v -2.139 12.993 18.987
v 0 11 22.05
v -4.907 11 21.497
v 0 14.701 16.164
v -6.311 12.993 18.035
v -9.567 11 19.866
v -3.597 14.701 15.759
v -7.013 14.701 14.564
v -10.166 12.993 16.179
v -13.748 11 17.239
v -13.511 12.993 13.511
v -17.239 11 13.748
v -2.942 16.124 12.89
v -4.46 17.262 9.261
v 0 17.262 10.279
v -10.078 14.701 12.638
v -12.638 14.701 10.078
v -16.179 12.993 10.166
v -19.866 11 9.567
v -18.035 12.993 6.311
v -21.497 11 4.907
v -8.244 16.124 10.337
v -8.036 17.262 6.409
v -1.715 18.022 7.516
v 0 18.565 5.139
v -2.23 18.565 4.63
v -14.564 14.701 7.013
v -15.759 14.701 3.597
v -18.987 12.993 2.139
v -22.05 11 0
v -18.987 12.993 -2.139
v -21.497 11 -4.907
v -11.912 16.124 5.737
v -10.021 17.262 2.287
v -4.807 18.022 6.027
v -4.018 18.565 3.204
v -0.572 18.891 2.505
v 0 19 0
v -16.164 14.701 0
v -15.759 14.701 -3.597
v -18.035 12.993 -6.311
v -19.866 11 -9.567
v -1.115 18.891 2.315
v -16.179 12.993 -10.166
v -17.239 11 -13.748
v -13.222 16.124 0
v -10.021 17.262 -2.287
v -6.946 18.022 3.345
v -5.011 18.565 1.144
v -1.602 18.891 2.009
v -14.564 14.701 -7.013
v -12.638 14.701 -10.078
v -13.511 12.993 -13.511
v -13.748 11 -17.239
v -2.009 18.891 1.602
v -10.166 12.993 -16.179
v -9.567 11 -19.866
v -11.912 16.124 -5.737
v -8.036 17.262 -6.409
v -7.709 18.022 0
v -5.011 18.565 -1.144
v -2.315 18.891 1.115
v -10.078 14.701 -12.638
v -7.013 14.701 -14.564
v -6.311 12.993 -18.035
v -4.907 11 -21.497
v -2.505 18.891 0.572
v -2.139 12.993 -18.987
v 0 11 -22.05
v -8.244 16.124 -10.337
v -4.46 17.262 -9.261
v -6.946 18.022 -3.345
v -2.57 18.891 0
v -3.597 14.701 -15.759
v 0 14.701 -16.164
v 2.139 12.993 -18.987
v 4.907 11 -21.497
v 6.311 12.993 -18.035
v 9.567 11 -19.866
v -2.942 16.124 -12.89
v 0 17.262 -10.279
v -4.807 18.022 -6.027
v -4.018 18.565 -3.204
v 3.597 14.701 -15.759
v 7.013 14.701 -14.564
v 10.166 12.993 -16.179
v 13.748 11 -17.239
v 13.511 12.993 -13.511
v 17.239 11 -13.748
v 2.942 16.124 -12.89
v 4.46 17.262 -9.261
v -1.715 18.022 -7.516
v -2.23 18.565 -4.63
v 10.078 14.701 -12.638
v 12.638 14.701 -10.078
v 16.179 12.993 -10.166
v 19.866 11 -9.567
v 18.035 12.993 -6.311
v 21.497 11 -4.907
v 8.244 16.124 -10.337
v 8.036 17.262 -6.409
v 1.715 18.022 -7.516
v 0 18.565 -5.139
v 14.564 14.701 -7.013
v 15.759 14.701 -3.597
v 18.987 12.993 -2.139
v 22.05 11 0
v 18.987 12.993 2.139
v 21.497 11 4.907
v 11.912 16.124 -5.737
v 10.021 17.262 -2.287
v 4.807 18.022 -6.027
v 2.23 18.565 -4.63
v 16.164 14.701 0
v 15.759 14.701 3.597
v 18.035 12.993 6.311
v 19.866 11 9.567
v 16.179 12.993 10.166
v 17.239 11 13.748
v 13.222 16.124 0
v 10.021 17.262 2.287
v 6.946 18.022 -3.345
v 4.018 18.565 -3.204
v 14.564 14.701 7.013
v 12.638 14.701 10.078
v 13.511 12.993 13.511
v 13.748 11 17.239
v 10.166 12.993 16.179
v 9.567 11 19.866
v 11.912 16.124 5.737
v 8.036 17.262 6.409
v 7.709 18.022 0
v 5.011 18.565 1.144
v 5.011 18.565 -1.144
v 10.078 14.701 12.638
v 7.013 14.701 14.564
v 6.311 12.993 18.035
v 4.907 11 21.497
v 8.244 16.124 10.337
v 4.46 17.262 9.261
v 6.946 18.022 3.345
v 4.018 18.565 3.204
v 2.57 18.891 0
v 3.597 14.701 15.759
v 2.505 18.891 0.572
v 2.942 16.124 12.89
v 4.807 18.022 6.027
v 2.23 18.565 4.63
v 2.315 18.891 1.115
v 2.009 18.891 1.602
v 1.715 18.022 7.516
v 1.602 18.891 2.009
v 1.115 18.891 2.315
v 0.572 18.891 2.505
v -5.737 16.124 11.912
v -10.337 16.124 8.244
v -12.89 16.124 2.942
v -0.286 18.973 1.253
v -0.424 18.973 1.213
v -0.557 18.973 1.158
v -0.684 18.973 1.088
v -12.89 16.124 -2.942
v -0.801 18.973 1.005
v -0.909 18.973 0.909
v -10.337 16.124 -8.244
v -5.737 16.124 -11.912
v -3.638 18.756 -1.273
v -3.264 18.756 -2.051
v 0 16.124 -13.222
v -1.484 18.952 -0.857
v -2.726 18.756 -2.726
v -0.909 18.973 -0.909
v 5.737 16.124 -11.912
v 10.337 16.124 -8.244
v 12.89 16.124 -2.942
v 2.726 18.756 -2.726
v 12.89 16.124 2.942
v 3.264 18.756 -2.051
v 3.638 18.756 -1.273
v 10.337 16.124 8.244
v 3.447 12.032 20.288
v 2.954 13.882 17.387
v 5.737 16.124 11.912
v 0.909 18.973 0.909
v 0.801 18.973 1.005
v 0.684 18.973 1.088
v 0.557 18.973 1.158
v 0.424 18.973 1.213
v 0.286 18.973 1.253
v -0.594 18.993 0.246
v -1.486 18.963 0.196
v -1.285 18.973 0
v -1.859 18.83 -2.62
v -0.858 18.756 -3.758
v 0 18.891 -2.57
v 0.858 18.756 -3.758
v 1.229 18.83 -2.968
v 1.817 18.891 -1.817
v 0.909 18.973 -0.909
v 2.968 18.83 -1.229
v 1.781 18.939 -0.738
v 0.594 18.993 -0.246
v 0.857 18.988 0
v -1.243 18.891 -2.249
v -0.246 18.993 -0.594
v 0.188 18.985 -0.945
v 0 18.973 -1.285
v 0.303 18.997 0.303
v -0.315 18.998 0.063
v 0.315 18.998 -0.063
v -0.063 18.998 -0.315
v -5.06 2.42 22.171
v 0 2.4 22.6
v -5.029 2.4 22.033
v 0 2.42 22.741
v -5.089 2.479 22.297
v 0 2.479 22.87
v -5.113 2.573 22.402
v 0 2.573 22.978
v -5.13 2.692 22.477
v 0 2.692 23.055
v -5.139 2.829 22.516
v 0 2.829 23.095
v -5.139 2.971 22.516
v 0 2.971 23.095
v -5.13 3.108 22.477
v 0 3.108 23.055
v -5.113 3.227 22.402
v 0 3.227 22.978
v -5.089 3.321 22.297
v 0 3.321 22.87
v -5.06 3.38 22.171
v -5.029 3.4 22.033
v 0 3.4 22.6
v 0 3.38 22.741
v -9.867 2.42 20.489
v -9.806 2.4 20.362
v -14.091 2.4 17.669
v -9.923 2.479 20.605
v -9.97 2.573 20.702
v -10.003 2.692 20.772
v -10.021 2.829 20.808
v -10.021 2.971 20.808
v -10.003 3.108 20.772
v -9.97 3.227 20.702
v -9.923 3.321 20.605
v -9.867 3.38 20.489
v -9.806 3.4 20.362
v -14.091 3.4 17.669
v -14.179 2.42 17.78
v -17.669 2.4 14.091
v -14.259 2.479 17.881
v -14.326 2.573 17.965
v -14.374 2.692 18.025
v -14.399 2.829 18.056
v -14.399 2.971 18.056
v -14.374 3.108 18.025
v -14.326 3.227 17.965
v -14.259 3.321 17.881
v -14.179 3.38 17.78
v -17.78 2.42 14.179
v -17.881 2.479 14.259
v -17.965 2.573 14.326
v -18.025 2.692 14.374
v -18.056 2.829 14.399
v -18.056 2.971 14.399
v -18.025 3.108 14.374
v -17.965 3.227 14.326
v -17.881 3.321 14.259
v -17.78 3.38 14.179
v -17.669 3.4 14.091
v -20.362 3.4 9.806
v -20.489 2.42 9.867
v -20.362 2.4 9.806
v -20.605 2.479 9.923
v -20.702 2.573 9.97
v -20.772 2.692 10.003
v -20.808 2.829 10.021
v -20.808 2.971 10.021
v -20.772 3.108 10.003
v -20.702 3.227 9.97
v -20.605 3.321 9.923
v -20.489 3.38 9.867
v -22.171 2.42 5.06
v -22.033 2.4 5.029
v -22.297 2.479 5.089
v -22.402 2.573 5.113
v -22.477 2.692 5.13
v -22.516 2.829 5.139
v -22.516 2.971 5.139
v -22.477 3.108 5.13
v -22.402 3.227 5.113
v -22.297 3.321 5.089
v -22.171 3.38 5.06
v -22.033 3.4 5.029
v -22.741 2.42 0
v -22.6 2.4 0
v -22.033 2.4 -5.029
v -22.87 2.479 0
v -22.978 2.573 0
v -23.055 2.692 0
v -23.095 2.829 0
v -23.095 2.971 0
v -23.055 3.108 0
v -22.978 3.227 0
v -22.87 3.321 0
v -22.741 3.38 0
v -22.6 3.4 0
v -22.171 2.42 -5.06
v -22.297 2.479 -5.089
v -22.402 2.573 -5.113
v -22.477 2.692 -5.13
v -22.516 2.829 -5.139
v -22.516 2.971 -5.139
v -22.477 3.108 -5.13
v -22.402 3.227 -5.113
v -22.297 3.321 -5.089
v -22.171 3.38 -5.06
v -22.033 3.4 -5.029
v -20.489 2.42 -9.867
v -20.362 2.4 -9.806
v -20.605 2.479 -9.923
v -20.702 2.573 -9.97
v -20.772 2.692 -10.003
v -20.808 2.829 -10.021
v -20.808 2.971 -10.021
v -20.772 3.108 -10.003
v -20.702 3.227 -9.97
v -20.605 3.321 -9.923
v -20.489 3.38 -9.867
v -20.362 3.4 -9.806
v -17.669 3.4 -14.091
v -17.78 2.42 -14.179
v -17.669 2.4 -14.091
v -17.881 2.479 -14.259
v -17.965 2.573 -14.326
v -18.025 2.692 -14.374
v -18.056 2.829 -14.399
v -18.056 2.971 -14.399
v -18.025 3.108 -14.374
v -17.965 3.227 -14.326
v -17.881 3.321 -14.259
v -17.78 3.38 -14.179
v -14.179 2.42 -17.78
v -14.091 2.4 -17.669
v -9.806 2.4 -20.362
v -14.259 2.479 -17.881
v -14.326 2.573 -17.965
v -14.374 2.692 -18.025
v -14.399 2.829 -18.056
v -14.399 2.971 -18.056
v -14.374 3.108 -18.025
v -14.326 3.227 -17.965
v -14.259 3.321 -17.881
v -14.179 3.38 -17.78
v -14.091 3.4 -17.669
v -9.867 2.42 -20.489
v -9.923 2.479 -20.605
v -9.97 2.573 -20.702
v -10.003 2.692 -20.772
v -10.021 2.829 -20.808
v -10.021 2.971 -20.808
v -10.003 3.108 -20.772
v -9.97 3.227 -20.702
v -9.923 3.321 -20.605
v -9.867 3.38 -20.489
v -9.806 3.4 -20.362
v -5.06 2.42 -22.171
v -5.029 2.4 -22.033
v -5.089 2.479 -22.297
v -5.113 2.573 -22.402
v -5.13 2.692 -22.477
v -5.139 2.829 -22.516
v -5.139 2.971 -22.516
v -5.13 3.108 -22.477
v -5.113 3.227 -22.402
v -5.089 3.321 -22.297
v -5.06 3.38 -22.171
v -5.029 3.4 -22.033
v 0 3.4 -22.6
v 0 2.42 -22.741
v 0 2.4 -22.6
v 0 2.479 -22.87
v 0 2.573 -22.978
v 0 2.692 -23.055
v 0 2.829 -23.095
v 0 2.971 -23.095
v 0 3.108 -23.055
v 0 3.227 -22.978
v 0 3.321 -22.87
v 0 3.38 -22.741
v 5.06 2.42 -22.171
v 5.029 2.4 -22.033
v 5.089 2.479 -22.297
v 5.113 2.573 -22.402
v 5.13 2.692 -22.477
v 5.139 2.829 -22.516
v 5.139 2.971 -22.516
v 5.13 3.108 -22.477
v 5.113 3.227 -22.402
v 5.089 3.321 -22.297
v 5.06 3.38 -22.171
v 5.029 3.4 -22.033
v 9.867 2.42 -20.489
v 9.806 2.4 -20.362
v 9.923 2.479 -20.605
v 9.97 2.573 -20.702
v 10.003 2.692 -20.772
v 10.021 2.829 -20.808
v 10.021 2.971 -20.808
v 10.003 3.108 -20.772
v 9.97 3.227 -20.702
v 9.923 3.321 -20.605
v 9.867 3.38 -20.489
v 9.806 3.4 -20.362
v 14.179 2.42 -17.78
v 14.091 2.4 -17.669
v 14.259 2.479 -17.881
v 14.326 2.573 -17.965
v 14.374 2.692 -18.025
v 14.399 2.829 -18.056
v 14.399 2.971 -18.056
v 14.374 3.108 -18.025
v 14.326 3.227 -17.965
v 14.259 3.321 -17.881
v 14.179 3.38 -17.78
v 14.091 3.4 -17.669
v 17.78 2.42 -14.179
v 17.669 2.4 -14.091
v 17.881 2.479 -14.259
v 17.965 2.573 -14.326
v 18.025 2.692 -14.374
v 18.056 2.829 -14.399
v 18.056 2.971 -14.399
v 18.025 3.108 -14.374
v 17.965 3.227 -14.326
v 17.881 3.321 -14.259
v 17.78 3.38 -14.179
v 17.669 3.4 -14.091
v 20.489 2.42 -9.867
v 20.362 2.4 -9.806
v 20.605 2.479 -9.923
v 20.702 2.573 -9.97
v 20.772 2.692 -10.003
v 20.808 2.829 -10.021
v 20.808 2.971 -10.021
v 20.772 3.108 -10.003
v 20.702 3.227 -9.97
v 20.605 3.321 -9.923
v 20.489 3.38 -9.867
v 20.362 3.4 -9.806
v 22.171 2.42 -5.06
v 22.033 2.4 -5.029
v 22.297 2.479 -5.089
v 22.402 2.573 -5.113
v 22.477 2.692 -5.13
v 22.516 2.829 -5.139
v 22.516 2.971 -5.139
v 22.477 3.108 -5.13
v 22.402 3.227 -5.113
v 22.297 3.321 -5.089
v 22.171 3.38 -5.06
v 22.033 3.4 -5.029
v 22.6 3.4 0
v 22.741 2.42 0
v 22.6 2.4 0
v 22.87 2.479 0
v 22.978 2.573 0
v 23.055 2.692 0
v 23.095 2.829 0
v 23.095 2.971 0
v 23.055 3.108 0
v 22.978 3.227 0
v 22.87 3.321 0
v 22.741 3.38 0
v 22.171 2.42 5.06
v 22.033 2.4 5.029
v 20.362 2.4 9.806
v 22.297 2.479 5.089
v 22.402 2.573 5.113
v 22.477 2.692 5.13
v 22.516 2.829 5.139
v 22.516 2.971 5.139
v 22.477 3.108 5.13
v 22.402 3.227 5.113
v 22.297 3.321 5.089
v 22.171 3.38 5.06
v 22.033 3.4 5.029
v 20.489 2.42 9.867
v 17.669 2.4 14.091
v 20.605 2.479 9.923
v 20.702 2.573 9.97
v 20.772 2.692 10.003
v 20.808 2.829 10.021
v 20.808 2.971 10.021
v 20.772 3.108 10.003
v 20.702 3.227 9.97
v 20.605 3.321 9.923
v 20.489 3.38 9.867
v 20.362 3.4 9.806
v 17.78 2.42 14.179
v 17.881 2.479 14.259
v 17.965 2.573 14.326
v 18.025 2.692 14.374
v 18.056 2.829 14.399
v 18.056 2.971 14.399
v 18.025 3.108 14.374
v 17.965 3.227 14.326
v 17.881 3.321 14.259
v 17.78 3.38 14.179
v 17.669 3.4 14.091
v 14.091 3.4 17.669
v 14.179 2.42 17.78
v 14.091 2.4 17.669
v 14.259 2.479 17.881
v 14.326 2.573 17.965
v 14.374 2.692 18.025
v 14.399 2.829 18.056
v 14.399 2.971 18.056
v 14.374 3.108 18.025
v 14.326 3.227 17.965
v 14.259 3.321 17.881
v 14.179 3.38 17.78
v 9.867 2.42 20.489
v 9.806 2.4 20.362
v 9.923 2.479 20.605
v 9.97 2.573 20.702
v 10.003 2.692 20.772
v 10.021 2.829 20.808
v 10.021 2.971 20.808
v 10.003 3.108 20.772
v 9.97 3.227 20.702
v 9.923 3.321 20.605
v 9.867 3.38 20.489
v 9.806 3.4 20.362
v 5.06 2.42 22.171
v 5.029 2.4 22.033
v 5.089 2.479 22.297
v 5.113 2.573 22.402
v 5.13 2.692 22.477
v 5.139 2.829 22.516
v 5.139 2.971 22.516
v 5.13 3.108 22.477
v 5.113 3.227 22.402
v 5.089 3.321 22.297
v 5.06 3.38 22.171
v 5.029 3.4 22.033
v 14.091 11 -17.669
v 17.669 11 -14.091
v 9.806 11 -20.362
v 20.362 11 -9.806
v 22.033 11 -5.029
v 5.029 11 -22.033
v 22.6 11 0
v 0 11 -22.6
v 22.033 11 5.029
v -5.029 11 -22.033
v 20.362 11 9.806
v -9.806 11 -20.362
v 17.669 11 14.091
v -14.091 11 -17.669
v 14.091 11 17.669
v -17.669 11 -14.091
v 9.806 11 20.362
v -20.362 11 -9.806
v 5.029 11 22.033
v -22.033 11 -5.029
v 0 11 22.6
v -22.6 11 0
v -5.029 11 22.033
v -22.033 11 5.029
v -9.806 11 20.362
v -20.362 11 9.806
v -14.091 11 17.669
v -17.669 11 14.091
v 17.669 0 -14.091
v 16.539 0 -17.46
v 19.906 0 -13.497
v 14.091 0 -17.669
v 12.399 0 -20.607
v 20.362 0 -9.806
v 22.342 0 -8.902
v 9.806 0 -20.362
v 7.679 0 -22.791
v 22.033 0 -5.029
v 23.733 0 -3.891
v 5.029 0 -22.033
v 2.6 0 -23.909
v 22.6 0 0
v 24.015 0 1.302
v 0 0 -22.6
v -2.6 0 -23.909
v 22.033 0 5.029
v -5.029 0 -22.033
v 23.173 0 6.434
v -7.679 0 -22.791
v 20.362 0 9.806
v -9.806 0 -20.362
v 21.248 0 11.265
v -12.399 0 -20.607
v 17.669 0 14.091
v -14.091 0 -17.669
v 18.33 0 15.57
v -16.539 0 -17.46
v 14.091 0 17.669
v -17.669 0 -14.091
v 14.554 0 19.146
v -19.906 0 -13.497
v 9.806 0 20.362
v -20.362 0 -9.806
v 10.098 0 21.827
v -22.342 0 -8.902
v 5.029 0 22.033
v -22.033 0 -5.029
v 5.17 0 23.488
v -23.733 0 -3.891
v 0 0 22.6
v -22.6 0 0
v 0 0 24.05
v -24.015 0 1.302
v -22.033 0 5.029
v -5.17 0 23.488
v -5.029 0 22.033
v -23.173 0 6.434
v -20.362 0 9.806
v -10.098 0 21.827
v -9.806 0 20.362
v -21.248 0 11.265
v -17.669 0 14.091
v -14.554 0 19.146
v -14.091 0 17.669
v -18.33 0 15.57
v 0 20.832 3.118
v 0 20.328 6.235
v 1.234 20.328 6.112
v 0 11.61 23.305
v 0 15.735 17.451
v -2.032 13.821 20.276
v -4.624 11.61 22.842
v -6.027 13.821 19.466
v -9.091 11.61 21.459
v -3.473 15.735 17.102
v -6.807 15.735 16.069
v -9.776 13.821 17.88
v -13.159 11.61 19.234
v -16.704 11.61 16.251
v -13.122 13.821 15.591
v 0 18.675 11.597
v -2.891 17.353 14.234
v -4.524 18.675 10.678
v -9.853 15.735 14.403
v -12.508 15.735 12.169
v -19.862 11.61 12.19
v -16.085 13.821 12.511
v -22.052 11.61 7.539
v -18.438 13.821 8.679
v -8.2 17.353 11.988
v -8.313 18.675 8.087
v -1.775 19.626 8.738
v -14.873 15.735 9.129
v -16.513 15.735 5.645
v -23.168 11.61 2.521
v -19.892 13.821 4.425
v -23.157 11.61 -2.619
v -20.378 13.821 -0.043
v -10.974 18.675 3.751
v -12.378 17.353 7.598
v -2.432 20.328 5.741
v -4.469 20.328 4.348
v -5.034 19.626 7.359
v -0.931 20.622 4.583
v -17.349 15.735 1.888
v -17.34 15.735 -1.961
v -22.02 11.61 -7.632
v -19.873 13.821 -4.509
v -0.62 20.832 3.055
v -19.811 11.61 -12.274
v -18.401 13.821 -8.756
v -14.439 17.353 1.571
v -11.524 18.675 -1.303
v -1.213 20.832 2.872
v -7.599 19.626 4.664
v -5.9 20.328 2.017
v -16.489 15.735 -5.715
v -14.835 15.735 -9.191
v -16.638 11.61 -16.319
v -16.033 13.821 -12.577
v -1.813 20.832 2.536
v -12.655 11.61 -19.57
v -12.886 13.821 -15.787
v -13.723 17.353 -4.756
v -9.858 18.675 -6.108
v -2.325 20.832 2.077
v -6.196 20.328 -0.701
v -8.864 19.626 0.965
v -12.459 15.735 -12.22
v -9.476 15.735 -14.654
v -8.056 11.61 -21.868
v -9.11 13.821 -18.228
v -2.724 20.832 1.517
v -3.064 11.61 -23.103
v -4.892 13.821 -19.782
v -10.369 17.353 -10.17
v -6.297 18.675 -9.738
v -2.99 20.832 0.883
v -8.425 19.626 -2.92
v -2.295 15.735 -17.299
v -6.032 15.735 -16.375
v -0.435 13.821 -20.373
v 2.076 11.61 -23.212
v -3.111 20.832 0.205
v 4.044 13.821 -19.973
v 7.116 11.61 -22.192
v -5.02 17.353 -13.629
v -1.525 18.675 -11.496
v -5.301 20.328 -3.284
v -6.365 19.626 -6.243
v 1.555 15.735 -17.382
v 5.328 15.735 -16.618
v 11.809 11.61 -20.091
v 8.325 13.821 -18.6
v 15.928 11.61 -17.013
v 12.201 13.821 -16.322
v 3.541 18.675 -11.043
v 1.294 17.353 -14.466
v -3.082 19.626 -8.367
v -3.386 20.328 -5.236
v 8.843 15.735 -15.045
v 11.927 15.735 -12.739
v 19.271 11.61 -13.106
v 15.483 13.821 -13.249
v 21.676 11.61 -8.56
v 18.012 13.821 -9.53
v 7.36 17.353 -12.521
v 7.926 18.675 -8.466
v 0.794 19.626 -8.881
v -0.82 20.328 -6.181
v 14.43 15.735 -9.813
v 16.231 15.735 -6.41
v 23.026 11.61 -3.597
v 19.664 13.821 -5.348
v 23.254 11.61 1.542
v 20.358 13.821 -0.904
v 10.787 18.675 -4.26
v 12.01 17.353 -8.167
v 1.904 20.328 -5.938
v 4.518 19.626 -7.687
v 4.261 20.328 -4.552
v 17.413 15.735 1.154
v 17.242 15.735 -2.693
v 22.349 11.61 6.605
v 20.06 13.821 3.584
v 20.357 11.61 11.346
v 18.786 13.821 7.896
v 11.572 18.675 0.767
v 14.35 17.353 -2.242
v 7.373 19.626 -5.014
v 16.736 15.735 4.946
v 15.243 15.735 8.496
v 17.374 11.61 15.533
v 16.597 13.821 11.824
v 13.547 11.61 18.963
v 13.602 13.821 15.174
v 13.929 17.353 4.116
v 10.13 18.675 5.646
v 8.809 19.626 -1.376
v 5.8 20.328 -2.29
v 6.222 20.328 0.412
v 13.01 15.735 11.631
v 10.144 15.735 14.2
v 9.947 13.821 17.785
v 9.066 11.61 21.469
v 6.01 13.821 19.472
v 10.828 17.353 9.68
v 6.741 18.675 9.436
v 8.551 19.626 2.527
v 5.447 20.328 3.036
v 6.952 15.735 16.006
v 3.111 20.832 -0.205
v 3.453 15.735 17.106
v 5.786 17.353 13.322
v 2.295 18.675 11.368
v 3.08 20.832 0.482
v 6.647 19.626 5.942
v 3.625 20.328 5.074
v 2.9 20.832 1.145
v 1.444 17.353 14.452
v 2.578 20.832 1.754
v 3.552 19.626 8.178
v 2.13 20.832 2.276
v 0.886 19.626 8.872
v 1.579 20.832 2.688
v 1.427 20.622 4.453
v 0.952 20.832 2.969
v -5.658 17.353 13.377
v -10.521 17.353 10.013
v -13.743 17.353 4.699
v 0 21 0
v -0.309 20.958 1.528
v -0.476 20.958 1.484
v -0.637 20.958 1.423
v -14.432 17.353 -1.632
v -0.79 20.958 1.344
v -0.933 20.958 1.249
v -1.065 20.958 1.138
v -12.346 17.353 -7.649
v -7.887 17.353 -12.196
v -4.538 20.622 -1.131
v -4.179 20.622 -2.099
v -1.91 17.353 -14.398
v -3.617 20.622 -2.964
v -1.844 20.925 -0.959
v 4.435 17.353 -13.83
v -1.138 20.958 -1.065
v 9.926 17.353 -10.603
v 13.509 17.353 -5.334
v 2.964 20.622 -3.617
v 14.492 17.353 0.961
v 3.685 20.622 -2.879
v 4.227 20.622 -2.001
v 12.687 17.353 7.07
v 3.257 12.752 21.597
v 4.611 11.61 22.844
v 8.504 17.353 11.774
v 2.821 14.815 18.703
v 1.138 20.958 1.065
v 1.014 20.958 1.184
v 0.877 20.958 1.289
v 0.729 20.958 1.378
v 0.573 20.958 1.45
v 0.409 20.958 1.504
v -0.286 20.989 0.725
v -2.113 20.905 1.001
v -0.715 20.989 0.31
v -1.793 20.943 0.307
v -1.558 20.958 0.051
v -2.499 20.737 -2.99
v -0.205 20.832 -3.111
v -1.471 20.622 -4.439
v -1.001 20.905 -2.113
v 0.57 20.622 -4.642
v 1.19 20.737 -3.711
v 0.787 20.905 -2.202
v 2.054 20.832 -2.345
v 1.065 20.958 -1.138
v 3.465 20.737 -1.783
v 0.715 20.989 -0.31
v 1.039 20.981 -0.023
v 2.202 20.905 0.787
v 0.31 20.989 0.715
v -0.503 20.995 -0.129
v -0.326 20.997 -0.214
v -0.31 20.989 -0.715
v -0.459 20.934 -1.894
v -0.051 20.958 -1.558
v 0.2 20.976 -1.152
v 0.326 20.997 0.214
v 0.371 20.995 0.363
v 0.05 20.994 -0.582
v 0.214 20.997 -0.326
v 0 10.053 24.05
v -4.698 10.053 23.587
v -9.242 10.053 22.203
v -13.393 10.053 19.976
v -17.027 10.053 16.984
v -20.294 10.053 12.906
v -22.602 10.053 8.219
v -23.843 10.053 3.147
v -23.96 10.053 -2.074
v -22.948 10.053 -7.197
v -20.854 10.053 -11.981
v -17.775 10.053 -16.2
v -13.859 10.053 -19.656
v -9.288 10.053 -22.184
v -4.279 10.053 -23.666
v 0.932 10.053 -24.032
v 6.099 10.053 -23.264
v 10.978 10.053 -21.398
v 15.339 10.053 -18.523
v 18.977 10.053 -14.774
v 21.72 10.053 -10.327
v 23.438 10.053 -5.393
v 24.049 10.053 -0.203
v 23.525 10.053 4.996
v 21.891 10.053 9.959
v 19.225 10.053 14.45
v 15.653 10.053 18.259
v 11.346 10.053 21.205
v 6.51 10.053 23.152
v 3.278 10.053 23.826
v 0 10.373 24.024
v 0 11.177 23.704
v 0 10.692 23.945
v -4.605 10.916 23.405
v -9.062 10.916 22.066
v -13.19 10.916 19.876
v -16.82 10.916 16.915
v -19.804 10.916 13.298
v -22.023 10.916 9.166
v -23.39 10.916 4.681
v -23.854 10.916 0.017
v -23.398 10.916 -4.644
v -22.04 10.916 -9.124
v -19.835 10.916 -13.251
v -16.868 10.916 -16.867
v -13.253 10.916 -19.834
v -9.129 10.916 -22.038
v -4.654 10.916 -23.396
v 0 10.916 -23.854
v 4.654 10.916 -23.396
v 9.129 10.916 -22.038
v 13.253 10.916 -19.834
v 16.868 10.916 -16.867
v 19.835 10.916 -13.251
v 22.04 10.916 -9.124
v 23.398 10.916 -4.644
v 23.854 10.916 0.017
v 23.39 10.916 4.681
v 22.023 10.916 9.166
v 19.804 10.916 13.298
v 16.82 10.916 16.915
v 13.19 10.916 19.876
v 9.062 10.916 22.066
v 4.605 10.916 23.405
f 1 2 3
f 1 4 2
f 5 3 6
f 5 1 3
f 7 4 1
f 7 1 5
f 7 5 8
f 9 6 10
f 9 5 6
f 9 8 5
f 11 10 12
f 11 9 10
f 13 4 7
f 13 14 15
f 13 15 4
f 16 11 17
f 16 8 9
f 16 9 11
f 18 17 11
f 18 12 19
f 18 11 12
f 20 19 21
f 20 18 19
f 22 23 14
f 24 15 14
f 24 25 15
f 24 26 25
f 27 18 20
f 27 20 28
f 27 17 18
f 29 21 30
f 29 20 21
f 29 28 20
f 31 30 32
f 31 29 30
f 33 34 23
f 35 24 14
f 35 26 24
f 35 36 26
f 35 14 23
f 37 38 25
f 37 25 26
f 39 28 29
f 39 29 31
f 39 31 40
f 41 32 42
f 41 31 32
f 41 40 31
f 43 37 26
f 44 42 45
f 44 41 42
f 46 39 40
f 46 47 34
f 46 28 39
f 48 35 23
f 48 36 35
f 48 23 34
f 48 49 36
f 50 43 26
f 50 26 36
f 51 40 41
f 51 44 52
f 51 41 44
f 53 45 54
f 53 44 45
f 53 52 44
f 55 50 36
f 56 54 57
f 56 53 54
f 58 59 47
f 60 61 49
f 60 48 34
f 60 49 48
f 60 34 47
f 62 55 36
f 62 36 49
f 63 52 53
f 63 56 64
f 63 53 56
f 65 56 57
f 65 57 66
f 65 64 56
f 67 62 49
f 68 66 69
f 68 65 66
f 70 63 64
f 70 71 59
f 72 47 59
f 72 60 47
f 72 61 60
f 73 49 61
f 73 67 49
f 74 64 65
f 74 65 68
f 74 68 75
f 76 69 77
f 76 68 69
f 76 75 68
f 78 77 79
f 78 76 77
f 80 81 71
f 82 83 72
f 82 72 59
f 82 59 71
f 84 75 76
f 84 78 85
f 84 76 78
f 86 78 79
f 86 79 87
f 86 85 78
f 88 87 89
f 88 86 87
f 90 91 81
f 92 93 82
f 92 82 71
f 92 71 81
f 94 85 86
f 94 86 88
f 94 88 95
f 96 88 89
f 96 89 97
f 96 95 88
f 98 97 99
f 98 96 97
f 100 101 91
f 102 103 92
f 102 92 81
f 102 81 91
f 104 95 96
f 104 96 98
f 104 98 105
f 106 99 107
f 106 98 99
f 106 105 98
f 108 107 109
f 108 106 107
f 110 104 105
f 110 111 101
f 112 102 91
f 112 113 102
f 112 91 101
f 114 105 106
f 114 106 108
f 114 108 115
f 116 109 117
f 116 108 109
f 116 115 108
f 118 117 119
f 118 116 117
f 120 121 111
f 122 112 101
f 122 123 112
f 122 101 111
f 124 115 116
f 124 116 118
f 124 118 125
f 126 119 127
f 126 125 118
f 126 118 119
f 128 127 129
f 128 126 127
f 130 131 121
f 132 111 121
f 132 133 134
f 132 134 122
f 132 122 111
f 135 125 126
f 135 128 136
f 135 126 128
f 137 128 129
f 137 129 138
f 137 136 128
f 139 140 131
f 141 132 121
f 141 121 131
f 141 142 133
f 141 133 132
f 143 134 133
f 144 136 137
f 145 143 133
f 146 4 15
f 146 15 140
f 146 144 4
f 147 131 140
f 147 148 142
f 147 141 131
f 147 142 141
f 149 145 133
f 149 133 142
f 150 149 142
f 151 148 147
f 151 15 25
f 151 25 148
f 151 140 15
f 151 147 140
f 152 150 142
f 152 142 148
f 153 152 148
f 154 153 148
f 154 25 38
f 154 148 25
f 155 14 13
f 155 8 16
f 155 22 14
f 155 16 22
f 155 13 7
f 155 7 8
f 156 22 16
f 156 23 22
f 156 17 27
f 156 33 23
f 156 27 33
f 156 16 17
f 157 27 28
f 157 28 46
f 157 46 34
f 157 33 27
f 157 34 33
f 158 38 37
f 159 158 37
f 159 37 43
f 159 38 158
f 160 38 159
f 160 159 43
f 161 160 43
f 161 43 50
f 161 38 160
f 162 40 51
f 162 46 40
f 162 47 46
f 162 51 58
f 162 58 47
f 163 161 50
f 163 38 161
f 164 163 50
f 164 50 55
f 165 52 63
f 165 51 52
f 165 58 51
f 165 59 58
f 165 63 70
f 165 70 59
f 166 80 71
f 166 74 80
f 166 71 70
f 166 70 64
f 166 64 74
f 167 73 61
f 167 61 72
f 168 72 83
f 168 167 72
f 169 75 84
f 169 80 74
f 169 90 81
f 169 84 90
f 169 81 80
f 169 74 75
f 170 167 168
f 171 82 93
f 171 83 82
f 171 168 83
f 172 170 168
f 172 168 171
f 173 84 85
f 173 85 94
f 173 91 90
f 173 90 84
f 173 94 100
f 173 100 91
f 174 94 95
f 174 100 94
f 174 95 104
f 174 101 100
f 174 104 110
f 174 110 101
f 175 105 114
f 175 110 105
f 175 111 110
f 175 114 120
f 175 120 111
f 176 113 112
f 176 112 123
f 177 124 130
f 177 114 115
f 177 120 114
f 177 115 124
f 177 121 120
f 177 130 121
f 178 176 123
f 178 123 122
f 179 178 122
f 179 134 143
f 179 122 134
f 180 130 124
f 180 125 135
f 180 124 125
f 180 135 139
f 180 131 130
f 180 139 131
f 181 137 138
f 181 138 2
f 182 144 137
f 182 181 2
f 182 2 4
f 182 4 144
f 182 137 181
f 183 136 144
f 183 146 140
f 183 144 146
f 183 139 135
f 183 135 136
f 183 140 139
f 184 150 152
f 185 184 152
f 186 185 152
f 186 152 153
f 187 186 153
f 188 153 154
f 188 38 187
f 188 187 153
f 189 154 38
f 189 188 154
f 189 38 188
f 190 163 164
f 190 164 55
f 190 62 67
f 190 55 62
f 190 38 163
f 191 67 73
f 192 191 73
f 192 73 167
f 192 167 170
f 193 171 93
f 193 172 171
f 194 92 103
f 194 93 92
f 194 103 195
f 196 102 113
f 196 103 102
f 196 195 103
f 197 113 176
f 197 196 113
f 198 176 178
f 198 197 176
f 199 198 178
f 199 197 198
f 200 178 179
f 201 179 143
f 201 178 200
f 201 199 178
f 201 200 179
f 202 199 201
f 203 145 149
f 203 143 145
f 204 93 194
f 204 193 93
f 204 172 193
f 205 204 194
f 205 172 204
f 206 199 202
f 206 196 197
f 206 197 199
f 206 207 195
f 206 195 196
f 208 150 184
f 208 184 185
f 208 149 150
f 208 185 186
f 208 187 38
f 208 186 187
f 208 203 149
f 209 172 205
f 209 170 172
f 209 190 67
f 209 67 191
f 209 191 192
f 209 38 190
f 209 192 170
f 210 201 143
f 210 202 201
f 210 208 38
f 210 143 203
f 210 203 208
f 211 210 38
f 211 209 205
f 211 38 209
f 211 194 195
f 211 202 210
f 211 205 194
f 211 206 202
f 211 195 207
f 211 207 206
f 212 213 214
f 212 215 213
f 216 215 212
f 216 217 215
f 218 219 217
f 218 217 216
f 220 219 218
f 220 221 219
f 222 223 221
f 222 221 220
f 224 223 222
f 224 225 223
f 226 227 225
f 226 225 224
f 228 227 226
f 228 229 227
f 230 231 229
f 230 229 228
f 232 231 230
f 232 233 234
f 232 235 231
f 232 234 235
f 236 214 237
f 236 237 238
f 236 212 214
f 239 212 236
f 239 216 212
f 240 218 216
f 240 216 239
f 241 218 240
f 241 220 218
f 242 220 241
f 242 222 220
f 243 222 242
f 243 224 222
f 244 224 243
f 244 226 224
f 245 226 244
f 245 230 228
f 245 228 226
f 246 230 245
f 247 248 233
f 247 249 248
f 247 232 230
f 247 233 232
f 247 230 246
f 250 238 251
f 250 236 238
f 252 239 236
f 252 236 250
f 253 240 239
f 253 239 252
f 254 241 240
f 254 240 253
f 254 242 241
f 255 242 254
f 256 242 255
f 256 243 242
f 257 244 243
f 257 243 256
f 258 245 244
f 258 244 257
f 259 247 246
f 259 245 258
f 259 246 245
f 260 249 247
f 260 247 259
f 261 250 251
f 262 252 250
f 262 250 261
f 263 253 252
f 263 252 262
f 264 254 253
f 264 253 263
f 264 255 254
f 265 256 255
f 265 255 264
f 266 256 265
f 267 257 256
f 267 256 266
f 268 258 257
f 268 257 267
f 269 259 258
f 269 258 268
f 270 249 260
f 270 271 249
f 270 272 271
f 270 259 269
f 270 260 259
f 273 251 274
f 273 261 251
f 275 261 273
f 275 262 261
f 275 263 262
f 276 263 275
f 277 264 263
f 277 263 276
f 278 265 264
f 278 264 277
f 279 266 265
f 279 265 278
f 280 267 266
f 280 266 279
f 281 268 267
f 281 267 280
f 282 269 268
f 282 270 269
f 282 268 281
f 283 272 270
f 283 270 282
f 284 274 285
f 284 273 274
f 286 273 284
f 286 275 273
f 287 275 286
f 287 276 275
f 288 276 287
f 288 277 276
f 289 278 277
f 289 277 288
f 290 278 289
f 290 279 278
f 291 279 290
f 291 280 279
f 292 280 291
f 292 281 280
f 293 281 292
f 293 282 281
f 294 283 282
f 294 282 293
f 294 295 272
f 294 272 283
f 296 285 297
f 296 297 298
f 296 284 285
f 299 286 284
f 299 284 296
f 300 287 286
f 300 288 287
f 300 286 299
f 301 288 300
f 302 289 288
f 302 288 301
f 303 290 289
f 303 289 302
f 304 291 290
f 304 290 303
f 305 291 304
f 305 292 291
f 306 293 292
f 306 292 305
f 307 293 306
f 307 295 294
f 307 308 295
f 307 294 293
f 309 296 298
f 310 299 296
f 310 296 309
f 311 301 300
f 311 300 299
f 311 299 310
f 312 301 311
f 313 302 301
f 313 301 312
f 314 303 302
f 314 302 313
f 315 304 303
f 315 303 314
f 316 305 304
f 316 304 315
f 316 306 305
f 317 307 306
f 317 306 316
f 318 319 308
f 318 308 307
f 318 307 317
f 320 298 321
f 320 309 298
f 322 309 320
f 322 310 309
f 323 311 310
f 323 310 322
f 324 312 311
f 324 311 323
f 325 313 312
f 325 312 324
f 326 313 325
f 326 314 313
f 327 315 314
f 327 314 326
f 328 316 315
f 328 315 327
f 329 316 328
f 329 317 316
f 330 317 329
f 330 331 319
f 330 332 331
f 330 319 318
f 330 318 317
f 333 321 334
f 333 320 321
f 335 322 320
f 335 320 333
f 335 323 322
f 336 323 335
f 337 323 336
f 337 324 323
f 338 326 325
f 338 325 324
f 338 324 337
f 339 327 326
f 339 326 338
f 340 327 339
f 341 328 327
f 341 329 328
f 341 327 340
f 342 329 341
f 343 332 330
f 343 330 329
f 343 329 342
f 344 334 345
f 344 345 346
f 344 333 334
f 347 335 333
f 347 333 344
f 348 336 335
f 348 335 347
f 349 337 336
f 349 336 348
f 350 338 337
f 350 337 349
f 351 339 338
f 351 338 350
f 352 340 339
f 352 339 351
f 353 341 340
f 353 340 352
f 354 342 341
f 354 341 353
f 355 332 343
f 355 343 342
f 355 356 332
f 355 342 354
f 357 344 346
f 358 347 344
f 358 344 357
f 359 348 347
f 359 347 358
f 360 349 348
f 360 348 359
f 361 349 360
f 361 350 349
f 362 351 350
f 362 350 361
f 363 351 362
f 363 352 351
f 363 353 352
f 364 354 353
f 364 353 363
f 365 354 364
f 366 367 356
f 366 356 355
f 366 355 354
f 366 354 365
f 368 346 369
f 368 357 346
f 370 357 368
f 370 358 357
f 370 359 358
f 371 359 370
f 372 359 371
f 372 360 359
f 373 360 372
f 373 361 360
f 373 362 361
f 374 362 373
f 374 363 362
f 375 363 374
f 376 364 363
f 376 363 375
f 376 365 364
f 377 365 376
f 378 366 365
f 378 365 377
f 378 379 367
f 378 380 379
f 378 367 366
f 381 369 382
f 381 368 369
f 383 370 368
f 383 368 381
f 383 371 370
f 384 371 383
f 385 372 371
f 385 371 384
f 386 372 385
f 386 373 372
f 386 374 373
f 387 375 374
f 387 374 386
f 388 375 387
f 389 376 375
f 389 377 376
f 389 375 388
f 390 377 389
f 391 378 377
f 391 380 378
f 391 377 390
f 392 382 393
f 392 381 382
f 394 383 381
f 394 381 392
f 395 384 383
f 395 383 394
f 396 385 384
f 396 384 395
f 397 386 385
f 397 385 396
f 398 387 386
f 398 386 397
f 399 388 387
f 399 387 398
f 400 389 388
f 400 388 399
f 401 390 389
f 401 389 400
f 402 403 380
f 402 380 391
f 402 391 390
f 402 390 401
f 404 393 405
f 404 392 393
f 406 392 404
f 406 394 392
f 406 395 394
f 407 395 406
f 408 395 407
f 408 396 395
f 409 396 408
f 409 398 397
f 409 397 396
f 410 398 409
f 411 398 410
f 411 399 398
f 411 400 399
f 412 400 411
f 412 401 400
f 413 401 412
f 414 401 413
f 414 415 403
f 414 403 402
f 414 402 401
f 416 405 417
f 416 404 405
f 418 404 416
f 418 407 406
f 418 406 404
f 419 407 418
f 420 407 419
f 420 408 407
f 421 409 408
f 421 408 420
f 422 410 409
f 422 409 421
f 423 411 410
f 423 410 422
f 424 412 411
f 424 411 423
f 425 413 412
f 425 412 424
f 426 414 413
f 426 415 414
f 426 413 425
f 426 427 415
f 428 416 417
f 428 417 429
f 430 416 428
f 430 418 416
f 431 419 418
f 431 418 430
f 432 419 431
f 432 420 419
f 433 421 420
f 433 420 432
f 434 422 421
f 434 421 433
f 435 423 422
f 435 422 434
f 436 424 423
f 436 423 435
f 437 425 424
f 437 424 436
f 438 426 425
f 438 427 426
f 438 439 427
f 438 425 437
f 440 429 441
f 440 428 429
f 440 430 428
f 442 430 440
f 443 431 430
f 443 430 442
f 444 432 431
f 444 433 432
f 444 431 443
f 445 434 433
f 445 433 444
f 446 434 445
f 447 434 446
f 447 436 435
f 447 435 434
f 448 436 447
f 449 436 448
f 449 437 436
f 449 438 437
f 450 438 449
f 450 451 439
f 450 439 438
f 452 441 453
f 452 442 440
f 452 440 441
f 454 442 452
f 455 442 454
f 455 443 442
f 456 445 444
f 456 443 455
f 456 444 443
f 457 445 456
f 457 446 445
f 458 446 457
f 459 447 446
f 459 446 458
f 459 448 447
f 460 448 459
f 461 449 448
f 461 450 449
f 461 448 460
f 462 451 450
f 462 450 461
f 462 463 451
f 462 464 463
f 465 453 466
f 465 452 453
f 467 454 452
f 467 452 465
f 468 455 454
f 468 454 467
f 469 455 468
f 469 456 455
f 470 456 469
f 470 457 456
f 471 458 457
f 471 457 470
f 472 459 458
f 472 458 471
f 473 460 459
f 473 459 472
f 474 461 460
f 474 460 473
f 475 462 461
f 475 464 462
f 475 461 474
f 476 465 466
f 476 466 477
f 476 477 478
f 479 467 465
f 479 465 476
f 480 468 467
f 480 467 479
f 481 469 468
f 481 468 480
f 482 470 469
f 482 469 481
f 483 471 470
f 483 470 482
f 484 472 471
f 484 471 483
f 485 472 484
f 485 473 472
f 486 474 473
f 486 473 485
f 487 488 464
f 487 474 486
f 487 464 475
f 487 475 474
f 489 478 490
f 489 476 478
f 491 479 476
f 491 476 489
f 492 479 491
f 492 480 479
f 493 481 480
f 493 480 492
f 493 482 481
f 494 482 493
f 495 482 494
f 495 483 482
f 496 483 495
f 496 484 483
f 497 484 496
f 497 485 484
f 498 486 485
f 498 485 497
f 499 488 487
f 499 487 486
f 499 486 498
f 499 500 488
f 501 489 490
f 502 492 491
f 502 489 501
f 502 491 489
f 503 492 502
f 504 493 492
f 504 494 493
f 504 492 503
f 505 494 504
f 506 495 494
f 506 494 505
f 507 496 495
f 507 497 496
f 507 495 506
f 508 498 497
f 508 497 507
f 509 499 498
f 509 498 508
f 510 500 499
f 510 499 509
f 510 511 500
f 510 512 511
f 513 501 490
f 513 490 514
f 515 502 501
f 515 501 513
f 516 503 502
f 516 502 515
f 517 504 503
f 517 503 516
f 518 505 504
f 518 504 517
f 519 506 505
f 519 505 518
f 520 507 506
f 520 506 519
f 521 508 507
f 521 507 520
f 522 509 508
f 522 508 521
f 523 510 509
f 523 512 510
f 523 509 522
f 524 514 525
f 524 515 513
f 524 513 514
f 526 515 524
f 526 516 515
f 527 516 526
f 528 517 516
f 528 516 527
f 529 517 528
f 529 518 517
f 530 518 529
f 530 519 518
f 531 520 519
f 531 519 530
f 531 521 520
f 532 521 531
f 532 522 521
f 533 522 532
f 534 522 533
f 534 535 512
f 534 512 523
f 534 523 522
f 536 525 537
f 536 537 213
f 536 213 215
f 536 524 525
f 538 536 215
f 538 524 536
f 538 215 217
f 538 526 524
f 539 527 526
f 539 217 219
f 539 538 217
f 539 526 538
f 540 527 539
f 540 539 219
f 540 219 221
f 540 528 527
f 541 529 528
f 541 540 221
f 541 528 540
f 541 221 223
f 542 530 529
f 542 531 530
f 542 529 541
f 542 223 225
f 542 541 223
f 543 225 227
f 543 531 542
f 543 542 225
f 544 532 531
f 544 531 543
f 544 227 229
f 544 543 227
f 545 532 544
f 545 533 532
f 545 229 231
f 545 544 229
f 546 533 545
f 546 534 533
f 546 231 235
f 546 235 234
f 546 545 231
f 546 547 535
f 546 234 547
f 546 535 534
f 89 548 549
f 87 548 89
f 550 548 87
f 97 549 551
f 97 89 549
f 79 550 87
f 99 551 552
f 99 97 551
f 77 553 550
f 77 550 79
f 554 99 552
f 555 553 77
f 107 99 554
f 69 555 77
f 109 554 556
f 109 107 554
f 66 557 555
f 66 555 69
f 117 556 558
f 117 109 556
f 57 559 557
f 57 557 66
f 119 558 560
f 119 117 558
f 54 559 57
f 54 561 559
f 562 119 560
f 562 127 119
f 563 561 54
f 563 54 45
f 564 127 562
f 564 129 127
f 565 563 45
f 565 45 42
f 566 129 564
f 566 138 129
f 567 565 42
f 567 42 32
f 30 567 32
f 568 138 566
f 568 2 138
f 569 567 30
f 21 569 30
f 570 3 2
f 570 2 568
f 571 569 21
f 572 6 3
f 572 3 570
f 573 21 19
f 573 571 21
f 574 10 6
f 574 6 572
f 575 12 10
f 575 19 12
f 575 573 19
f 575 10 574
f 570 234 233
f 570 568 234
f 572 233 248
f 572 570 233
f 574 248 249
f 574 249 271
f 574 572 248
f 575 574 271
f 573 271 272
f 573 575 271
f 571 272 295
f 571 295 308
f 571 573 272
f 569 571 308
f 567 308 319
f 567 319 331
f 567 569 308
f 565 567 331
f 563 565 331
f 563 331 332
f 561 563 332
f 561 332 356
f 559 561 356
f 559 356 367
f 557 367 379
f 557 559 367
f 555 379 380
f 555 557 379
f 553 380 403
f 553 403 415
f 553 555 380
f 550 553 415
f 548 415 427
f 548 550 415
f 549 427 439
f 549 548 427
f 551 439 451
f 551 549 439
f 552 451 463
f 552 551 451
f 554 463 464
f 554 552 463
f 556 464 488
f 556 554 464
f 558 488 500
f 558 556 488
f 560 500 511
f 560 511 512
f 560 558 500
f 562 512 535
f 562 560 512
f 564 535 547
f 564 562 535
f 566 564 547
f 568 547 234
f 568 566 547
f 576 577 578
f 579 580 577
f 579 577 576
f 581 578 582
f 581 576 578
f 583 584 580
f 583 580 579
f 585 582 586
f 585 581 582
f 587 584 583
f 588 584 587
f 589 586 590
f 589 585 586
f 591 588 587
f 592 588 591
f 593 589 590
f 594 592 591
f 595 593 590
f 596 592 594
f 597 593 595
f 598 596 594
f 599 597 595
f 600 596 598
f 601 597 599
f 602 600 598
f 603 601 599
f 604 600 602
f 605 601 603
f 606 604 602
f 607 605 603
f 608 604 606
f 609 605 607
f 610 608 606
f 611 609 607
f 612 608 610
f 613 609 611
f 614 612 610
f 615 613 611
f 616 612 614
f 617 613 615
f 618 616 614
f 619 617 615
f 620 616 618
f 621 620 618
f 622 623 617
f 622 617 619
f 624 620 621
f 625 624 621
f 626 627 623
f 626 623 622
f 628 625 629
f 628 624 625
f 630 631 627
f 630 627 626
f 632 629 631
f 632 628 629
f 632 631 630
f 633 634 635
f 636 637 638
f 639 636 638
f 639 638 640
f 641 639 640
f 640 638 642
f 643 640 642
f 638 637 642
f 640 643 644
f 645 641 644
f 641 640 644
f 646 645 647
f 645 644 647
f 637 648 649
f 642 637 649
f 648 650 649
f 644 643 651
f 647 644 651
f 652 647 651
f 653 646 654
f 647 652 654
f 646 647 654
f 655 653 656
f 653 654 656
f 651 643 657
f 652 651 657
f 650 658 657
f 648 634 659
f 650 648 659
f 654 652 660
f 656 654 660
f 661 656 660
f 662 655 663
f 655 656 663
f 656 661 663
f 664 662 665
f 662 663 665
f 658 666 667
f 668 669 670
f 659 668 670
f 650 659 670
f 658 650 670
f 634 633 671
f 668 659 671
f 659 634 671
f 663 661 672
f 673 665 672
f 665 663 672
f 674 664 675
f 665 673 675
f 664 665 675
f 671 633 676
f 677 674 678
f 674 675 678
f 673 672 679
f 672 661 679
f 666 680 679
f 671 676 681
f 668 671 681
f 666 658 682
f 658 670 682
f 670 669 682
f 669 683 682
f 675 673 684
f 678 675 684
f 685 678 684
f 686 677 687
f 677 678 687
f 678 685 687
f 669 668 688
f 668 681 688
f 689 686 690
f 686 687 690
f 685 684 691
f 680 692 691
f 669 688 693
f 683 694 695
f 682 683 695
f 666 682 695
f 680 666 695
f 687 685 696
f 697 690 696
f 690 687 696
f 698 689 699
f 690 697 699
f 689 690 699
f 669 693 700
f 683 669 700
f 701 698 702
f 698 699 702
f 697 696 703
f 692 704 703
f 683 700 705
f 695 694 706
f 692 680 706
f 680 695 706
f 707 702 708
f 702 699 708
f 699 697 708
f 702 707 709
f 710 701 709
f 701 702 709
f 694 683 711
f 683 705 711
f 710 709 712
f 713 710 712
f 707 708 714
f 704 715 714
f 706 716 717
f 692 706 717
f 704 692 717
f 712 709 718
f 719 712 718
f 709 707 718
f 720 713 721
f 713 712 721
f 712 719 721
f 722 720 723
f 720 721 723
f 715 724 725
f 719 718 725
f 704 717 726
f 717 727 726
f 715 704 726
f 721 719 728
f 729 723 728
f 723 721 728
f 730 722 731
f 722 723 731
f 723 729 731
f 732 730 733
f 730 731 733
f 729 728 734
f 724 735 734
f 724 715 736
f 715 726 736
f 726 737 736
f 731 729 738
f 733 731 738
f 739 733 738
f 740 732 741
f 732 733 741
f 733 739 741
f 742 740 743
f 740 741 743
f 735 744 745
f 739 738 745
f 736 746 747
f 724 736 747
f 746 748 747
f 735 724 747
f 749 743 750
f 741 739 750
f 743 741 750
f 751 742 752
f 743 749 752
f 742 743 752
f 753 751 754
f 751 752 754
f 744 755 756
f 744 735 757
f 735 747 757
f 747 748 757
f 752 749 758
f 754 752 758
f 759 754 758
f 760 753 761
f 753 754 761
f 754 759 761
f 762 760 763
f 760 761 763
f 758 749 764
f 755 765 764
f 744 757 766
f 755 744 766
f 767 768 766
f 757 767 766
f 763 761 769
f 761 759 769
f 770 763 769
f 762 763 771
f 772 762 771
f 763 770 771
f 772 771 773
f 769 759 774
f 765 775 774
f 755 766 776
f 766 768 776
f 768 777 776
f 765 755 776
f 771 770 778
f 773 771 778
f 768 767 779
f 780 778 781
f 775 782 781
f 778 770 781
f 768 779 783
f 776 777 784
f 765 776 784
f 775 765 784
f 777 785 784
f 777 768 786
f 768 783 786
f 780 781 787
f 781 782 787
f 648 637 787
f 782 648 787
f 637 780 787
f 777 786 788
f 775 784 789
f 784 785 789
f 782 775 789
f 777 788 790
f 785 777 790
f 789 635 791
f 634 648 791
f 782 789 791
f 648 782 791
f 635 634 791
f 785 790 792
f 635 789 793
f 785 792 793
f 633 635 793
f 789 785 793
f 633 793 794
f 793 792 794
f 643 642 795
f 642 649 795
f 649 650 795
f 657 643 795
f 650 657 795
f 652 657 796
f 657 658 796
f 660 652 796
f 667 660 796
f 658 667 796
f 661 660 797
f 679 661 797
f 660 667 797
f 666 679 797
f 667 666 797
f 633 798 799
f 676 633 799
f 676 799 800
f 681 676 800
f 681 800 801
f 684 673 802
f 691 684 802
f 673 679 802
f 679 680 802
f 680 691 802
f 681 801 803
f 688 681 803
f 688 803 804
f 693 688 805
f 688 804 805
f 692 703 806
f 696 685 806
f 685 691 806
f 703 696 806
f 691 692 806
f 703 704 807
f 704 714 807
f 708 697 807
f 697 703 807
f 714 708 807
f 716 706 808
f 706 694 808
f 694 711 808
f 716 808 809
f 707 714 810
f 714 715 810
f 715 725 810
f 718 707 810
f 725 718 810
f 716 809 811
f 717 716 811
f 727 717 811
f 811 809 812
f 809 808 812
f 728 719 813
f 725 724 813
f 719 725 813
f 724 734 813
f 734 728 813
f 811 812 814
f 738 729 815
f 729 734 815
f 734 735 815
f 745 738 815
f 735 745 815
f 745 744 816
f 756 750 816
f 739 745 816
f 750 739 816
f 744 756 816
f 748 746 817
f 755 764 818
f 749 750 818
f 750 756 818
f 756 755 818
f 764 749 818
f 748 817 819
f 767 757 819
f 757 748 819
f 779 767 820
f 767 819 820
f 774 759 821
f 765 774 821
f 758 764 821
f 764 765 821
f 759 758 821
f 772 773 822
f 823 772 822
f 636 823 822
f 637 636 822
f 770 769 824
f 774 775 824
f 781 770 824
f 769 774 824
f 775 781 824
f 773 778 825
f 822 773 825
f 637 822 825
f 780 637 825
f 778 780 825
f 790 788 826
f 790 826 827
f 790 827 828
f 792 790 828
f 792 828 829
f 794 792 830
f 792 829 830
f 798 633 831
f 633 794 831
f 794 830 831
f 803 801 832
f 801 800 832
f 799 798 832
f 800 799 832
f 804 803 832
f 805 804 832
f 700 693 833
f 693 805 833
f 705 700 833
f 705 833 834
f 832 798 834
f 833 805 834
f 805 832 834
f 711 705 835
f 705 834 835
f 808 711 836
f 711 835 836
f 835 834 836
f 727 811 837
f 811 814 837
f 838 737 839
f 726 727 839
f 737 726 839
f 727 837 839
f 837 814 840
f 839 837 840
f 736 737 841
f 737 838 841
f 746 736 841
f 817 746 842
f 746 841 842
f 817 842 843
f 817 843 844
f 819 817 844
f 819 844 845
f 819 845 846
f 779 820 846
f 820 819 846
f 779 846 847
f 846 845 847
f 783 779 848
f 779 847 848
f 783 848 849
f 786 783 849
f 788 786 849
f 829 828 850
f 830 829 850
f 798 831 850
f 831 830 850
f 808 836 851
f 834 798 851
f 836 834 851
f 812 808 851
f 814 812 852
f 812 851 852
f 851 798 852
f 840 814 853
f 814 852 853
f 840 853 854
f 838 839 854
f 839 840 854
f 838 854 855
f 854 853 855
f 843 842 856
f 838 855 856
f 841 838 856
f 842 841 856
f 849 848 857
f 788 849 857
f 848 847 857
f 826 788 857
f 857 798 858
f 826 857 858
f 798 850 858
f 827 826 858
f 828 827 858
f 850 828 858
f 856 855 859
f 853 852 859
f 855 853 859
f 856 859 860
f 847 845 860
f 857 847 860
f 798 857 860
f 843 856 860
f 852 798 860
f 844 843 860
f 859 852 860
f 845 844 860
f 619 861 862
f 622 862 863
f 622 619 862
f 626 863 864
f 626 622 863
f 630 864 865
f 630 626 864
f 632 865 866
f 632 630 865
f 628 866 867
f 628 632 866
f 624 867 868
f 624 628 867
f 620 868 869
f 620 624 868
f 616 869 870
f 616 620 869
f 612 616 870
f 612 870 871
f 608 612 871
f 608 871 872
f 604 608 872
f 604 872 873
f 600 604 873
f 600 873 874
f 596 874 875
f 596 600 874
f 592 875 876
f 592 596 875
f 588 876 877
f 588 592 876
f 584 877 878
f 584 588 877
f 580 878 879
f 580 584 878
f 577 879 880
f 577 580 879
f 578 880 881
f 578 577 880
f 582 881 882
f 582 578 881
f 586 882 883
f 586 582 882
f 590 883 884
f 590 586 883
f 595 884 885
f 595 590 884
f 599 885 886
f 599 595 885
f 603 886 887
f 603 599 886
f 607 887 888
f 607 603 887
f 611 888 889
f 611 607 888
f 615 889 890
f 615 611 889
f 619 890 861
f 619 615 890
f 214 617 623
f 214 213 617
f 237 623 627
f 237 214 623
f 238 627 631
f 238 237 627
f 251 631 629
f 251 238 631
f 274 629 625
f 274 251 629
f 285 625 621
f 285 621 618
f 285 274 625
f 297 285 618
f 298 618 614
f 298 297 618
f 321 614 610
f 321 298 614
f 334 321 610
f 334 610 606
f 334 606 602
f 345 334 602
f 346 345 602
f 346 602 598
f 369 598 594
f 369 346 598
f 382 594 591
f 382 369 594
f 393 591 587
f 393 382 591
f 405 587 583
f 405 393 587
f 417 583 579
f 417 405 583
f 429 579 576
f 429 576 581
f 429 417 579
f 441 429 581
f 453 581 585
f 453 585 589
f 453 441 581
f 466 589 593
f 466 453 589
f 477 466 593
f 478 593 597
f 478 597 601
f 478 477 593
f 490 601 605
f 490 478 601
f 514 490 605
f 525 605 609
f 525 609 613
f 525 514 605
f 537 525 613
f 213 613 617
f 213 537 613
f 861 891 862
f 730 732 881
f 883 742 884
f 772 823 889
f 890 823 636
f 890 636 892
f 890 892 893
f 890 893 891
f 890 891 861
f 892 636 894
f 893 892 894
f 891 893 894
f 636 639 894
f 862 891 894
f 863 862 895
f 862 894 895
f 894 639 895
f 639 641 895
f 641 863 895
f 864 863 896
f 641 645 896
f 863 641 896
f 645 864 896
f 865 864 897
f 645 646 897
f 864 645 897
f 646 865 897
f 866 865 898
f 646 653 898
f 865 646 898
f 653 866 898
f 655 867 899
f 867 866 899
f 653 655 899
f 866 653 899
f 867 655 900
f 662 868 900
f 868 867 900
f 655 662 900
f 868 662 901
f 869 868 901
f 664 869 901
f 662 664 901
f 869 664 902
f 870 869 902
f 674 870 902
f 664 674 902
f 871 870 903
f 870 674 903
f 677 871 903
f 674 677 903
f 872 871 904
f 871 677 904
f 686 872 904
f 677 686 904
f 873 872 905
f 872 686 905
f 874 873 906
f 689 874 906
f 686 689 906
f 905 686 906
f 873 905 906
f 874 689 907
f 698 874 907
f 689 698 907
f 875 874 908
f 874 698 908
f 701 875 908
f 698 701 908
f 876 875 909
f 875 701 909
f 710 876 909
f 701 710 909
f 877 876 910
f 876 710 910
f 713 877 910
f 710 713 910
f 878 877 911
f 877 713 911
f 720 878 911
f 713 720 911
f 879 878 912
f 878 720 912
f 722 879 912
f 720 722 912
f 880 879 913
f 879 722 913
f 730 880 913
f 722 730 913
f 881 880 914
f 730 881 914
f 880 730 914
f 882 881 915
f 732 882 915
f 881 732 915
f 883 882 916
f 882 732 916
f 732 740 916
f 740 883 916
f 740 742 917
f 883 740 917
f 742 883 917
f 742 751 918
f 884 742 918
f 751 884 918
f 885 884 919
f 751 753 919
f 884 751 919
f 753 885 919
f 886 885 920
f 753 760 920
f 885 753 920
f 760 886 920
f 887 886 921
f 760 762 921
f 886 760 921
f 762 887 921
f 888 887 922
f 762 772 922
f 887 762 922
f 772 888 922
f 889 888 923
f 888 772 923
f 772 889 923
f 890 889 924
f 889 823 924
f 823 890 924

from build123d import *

# Parameters (mm, degrees)
FILLET1_R = 2


with BuildPart() as part:
    # Sketch1 → Revolve2 (revolve)
    with BuildSketch(Plane.XY, mode=Mode.PRIVATE) as revolve2_sk:
        with BuildLine():
            Line((-24.05, 0), (-22.6, 0))
            Line((-22.6, 0), (-22.6, 2.4))
            ThreePointArc((-22.6, 2.4), (-23.1, 2.9), (-22.6, 3.4))
            Line((-22.6, 3.4), (-22.6, 11))
            Line((-22.6, 11), (-22.05, 11))
            add(Edge.make_bspline(
                [(-22.05, 11), (-11.025, 19), (0, 19)],
                knots=[0, 0, 0, 0.5, 0.5, 0.5], degree=2))
            Line((0, 19), (0, 21))
            add(Edge.make_bspline(
                [(-24.05, 11), (-12.025, 21), (0, 21)],
                knots=[0, 0, 0, 0.5, 0.5, 0.5], degree=2))
            Line((-24.05, 11), (-24.05, 0))
        make_face()
    revolve(revolve2_sk.sketch.rotate(Axis((0, 21, 0), (0, -1, 0)), 270), axis=Axis((0, 21, 0), (0, -1, 0)))

    # Fillet1
    fillet1_edges = [part.edges().sort_by_distance(p)[0] for p in [
        (0, 11, -24.05),
    ]]
    fillet(fillet1_edges, radius=FILLET1_R)


solid = part.part
